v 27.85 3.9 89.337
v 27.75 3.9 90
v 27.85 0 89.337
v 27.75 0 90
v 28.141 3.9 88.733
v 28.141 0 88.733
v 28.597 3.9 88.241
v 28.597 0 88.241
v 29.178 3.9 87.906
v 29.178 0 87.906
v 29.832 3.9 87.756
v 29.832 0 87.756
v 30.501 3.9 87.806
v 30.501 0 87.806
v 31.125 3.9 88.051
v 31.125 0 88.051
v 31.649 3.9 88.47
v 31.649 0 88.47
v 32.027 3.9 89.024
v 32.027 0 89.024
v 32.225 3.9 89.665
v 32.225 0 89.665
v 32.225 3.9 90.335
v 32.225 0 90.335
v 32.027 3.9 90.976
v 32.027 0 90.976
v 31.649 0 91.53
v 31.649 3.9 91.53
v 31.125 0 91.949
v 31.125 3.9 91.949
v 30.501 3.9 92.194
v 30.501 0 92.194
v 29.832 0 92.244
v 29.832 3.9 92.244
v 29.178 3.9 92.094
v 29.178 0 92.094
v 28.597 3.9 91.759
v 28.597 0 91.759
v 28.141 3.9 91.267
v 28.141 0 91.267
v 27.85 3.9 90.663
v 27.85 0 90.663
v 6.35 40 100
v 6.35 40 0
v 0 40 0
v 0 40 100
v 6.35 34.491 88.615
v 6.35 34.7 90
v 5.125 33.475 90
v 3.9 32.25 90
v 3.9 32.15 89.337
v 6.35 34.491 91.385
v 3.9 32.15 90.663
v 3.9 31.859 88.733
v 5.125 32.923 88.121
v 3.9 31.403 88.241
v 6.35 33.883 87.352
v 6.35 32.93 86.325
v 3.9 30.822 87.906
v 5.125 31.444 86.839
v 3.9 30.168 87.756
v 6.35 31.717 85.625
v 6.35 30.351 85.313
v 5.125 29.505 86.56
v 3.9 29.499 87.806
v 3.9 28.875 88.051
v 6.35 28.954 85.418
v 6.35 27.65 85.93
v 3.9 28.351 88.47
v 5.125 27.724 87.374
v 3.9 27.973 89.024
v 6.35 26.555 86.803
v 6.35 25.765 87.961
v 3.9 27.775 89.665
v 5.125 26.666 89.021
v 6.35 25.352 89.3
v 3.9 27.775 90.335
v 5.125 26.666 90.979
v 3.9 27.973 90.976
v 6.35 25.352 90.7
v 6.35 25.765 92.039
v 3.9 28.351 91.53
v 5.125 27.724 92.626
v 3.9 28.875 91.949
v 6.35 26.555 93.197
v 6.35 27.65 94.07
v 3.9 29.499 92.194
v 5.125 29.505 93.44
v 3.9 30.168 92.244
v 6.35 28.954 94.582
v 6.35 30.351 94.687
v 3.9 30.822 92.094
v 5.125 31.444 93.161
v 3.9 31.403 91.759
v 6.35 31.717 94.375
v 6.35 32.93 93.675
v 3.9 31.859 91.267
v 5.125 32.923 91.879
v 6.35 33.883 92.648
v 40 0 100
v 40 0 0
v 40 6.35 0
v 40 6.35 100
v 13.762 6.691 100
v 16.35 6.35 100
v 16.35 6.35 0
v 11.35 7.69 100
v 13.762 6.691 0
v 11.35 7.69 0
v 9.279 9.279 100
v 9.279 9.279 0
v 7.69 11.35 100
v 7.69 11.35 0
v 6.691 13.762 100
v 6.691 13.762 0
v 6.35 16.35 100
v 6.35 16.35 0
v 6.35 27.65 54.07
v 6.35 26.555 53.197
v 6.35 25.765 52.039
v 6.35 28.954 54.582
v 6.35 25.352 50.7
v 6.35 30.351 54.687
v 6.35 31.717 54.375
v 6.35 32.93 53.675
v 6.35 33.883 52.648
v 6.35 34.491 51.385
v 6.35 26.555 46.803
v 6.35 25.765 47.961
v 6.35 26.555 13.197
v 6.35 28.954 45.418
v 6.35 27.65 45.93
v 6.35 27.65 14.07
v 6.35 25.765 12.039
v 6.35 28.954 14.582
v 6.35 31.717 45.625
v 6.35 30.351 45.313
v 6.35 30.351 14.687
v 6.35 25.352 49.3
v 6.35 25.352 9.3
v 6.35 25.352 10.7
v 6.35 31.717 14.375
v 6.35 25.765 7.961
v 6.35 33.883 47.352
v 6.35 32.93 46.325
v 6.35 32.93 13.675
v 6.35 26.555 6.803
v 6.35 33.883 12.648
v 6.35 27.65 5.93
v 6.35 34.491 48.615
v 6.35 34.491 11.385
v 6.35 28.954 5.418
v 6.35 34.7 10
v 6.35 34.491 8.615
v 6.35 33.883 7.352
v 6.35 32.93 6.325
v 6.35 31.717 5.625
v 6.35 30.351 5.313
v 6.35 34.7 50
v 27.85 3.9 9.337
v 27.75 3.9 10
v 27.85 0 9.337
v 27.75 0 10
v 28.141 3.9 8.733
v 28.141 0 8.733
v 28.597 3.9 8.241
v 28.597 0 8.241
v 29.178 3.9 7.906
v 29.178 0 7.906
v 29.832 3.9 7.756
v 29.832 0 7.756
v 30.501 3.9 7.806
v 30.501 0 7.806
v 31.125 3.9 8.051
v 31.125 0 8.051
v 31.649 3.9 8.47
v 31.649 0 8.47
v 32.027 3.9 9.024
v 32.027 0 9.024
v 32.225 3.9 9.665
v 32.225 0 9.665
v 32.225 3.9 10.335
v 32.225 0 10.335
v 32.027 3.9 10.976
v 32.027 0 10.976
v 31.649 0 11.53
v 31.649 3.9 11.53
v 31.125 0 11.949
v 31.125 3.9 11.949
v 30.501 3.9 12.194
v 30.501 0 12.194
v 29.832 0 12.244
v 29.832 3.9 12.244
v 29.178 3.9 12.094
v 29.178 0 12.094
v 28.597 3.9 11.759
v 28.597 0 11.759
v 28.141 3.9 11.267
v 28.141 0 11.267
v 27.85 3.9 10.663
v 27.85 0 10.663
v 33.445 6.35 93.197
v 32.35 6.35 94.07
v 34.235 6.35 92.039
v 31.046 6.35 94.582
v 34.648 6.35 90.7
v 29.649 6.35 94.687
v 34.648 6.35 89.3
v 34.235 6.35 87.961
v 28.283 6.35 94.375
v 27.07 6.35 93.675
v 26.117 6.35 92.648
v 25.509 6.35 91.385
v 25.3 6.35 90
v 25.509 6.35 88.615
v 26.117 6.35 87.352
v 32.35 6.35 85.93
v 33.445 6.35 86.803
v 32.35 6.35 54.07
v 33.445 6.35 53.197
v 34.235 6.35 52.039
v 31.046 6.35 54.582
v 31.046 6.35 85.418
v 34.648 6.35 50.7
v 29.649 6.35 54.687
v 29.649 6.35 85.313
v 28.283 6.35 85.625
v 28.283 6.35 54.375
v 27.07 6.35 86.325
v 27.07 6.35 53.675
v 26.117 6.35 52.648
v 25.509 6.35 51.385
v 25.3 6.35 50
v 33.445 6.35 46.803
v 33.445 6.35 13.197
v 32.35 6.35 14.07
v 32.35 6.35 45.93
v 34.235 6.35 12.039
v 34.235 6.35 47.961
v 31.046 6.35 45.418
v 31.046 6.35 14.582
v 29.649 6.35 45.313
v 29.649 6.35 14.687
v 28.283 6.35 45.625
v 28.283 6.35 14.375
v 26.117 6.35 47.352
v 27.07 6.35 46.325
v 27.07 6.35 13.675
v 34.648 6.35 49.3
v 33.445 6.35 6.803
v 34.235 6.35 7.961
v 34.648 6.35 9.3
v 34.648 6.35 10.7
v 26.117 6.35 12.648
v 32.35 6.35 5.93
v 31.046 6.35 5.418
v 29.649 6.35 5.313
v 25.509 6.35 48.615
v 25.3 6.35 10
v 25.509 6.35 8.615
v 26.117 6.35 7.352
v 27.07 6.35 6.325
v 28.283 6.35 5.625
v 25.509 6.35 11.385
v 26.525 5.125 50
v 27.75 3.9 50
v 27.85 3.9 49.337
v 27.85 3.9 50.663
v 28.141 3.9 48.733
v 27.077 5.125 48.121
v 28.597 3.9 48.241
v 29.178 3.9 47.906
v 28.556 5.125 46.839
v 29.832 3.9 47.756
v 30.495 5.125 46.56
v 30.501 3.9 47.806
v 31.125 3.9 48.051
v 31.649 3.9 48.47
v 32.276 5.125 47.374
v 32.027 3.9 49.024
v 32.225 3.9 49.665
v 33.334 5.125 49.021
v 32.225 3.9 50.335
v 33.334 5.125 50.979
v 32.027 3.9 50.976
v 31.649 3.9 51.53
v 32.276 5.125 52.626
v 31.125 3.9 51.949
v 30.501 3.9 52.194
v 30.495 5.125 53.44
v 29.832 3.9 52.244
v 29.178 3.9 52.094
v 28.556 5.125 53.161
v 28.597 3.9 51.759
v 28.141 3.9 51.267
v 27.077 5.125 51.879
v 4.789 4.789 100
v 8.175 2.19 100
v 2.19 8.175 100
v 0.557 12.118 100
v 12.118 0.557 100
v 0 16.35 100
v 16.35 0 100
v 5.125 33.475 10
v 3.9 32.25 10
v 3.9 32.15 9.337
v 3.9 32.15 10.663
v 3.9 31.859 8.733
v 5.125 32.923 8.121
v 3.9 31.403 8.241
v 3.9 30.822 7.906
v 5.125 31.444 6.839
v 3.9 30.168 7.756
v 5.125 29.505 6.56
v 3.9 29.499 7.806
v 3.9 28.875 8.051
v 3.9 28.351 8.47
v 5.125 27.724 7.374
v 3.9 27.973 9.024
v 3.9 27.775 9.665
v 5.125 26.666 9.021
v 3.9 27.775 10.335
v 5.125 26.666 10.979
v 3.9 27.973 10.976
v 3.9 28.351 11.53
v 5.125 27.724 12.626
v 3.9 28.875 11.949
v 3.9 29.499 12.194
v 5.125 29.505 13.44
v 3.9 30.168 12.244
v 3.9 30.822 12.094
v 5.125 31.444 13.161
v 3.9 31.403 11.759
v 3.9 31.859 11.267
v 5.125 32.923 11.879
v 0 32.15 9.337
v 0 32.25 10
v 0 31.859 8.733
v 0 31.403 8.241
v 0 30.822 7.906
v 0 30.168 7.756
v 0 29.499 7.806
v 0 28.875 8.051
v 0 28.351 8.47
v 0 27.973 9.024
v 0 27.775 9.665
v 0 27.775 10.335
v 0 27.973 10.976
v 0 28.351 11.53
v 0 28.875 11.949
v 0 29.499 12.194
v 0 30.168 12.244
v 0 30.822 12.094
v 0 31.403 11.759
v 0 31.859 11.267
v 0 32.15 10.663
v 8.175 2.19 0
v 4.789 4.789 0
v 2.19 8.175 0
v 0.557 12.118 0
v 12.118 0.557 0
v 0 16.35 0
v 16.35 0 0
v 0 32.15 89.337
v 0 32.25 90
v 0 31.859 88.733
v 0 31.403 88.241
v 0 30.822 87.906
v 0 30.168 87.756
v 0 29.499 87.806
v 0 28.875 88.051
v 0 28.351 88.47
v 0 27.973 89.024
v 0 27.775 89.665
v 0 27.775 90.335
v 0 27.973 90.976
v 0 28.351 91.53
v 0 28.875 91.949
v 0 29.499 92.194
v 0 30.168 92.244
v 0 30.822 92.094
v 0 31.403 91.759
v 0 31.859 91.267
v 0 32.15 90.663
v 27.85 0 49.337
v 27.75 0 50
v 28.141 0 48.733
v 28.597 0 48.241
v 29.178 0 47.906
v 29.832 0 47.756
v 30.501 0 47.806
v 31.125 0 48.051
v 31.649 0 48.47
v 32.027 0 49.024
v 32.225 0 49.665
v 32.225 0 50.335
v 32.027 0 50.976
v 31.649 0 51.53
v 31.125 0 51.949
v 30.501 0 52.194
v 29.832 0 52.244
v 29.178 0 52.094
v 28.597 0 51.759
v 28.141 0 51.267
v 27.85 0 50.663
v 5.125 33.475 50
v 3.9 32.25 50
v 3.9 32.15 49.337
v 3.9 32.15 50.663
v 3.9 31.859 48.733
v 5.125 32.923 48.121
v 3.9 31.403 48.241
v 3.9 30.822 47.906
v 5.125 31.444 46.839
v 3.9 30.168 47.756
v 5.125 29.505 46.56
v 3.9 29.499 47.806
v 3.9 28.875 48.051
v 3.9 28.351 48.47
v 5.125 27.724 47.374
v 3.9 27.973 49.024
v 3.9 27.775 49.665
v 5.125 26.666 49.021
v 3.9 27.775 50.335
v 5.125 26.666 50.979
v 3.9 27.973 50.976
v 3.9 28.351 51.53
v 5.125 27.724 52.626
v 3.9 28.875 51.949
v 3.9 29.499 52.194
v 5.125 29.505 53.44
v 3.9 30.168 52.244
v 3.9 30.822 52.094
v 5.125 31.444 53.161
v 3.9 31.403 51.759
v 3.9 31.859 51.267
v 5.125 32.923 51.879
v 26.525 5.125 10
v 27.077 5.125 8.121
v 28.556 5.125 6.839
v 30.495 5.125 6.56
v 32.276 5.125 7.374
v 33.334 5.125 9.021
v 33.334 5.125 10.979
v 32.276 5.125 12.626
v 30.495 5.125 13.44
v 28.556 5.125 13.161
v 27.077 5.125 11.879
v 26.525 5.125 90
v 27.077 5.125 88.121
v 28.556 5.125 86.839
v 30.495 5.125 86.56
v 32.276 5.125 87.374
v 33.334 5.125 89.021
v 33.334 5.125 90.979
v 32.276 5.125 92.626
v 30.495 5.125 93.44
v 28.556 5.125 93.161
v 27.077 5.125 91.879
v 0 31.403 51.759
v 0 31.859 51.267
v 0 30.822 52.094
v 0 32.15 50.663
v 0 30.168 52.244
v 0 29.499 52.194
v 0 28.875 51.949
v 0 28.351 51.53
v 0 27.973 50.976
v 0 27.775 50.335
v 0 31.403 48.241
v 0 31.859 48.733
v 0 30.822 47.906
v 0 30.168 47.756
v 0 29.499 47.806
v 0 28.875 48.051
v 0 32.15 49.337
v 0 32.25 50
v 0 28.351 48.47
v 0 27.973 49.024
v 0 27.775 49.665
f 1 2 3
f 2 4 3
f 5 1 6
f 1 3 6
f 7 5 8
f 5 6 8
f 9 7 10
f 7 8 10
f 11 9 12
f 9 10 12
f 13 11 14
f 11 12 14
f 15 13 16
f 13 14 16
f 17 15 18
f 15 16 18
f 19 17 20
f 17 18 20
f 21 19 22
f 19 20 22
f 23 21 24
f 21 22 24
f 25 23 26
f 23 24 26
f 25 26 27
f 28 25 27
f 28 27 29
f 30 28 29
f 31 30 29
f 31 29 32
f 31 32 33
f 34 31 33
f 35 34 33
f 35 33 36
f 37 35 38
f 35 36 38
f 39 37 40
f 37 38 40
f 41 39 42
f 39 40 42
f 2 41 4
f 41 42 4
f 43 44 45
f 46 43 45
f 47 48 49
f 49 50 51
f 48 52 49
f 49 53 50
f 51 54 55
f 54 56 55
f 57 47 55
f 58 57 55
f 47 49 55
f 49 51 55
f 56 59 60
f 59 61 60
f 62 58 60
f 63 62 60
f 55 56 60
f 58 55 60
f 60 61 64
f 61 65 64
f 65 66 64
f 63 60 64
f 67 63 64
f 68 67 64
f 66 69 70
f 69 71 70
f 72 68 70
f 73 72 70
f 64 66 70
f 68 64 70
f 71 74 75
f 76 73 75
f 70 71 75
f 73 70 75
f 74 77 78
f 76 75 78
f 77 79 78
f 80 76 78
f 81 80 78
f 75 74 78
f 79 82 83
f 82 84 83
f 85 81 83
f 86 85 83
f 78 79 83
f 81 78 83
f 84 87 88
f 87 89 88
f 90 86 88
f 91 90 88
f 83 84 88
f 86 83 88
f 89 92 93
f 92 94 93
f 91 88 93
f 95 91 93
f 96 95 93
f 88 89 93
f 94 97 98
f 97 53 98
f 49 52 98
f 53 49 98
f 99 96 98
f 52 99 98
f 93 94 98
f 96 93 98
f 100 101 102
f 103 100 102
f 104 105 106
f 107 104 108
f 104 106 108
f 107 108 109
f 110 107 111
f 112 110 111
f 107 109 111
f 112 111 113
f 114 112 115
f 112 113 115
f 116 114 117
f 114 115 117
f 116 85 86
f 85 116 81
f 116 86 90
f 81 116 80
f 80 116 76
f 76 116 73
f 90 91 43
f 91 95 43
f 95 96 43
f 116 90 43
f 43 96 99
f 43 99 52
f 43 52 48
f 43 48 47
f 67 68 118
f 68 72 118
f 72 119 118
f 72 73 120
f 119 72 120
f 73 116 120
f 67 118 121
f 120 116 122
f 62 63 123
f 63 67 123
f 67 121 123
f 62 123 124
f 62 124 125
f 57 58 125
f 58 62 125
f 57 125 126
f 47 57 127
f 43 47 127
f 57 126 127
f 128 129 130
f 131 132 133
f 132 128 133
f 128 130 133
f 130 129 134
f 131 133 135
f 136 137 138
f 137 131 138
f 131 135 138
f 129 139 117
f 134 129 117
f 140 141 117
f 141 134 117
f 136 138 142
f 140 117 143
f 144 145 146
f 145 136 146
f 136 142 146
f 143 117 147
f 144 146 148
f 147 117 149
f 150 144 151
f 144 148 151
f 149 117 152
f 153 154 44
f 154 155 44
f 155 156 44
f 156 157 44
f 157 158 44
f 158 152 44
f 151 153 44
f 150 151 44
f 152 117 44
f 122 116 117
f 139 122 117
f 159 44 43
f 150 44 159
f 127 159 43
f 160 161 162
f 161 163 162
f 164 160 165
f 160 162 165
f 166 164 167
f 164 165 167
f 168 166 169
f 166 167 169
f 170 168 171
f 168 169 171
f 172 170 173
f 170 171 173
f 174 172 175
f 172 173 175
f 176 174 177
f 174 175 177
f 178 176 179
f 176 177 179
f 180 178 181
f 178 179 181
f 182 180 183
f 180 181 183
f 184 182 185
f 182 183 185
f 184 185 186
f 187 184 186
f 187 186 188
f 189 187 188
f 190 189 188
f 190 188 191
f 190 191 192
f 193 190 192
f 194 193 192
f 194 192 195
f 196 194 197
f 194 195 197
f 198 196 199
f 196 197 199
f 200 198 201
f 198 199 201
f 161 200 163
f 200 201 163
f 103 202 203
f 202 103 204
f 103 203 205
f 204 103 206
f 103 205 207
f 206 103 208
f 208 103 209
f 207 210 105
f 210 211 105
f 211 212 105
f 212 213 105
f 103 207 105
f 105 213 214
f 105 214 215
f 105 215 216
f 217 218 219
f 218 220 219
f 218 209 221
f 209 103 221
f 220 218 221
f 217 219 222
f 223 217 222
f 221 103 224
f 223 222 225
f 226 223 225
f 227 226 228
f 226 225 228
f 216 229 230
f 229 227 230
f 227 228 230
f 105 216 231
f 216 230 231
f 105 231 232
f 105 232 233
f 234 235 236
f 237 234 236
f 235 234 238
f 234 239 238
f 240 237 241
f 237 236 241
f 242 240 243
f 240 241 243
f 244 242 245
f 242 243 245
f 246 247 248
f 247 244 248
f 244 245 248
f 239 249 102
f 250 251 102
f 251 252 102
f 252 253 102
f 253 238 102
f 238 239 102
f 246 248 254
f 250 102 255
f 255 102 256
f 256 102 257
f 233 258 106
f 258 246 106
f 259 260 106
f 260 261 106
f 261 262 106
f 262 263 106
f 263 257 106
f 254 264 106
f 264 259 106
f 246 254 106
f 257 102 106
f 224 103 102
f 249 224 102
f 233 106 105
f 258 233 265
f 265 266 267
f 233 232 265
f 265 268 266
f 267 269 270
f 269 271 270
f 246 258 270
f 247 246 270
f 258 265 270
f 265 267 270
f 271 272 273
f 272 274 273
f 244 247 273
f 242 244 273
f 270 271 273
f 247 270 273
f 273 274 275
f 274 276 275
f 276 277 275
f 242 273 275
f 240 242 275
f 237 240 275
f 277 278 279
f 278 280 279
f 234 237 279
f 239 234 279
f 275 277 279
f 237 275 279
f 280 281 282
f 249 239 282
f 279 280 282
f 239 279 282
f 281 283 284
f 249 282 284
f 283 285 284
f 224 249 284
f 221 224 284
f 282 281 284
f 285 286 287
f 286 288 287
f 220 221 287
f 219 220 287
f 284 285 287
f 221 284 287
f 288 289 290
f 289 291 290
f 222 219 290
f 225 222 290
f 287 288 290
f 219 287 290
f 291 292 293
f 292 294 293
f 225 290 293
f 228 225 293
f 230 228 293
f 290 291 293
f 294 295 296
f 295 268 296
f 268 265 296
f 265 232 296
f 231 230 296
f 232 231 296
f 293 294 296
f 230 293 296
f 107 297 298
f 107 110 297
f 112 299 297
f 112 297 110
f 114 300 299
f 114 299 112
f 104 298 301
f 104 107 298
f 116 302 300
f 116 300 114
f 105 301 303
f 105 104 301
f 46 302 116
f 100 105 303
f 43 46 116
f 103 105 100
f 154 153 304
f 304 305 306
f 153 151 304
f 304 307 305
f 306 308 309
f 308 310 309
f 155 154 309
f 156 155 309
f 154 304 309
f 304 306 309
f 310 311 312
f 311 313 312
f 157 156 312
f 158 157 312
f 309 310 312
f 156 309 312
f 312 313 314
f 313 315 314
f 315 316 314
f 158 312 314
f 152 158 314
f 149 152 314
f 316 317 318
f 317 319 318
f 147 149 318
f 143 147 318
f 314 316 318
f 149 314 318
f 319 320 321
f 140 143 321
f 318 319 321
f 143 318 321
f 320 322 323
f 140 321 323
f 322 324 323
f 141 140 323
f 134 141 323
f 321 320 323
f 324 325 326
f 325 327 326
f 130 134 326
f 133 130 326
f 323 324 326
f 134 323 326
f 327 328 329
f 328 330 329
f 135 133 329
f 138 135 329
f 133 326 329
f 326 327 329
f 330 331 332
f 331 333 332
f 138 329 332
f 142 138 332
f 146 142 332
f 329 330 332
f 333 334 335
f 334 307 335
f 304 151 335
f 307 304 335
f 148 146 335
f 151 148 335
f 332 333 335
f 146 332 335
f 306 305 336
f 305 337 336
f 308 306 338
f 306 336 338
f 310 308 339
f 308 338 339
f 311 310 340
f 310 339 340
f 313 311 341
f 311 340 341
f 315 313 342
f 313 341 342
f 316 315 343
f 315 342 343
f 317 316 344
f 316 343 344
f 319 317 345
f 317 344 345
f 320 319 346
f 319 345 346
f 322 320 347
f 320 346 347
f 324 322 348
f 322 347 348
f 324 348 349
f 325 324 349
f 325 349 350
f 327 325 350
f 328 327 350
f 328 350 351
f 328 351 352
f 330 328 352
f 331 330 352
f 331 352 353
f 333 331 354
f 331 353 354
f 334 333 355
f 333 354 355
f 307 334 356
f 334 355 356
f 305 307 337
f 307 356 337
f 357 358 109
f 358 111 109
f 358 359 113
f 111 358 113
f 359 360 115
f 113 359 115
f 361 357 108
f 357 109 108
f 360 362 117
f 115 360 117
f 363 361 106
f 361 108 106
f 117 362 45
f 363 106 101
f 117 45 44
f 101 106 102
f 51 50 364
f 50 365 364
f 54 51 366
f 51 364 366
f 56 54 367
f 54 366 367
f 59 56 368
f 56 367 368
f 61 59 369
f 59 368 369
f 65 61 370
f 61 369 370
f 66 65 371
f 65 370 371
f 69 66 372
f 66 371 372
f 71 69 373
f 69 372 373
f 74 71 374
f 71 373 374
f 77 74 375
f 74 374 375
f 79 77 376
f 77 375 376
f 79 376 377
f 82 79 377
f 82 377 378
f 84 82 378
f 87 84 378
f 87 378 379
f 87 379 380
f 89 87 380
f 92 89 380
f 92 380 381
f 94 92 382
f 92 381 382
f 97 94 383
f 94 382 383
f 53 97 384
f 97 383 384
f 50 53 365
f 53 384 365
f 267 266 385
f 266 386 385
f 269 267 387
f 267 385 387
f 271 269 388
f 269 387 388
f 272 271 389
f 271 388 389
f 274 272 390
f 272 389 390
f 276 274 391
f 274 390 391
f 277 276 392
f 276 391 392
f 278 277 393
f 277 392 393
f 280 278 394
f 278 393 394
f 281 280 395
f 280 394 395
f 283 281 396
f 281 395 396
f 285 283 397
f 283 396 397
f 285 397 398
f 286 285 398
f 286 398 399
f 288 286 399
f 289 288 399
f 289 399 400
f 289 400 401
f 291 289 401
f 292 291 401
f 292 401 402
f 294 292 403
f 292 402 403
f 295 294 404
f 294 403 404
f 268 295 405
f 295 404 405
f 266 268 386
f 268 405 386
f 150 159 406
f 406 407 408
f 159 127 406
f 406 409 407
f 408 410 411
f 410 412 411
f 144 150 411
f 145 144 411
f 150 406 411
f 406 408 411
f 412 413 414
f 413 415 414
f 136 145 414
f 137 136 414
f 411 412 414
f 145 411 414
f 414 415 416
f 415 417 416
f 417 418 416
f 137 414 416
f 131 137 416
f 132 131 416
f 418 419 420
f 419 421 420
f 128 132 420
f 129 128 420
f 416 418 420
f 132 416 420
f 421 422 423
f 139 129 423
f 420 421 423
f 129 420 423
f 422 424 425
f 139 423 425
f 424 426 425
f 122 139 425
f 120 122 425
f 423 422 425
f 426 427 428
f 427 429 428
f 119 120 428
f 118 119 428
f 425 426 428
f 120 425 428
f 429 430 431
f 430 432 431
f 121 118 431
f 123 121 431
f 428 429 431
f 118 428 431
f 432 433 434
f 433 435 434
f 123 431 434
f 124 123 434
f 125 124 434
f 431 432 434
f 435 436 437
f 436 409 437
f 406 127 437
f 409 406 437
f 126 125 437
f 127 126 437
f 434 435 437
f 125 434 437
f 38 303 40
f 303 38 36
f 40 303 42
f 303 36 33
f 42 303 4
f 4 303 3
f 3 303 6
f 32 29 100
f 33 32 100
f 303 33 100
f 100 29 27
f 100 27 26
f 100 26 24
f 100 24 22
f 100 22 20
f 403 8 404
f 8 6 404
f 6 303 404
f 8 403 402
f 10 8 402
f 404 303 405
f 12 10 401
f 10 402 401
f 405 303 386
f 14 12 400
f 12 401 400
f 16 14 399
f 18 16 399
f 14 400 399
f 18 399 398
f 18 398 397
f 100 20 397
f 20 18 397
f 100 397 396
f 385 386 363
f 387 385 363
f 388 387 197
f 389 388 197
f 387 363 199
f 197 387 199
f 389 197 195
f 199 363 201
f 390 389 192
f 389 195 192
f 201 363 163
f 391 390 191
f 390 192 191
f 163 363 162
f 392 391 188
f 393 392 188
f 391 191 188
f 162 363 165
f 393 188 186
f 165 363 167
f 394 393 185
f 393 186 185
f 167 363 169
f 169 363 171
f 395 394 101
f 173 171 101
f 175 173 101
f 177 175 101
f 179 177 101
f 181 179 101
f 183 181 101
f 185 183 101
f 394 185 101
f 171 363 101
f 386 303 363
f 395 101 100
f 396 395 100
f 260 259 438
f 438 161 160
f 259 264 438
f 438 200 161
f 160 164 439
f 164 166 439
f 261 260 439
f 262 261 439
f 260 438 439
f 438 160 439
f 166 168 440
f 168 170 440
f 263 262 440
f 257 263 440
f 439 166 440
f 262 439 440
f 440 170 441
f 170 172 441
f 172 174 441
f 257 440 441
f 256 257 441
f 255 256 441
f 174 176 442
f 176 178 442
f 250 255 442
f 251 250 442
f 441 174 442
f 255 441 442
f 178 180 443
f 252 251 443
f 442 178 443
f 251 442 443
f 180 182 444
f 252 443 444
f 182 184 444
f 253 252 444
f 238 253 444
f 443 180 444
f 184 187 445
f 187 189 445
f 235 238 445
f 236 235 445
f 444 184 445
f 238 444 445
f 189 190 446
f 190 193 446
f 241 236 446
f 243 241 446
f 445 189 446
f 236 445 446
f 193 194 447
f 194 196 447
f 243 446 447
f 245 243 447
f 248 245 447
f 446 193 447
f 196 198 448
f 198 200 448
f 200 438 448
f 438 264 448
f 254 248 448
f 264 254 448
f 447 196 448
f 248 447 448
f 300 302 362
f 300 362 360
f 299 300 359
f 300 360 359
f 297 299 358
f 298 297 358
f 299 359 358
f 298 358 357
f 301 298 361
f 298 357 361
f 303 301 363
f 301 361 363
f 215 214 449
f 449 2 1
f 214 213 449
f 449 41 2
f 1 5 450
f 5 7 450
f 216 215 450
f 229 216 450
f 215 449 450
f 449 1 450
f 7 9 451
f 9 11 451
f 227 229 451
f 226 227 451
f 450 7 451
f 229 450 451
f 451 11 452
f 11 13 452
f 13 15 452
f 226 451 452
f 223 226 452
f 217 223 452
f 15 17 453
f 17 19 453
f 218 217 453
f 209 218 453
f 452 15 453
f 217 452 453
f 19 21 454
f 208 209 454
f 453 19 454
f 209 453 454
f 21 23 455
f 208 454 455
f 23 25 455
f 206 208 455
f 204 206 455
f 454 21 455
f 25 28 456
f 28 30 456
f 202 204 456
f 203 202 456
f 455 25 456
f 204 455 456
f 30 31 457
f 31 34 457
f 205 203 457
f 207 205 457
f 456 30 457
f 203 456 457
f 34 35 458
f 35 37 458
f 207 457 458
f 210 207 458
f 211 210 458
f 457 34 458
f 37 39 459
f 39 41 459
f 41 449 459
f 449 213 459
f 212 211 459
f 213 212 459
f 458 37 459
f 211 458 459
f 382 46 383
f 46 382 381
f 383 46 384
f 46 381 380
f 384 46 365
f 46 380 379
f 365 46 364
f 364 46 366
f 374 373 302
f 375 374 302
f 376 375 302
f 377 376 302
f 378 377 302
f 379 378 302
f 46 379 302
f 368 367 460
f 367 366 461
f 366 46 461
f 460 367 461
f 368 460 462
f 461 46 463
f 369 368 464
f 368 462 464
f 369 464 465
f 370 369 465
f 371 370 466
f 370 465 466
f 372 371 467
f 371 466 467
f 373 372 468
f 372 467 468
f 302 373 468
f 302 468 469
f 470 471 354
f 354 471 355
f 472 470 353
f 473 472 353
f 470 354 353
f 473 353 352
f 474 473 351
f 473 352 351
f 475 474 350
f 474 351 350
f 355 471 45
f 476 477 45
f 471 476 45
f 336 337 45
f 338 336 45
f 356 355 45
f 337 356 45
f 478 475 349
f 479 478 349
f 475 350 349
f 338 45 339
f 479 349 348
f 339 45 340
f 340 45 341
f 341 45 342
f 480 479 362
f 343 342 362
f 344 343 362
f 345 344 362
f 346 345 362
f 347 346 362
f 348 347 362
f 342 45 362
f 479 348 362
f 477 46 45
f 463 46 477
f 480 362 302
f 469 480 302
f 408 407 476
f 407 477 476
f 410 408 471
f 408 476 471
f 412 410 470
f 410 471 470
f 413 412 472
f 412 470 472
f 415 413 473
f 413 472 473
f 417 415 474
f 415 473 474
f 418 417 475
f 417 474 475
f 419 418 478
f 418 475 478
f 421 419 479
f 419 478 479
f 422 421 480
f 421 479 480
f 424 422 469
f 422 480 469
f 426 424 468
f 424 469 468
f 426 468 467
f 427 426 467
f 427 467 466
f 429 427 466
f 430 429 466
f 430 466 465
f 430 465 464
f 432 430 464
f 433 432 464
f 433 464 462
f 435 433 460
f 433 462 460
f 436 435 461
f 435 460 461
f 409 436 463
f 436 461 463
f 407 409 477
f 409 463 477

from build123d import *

# Parameters (mm, degrees)
BOSS_EXTRUDE1_DEPTH                             = 100
CSK_FOR_M4_FLAT_HEAD_MACHINE_SCREW1_D           = 4.5
CSK_FOR_M4_FLAT_HEAD_MACHINE_SCREW1_CSINK_D     = 9.4
CSK_FOR_M4_FLAT_HEAD_MACHINE_SCREW1_CSINK_ANGLE = 90
CSK_FOR_M4_FLAT_HEAD_MACHINE_SCREW4_D           = 4.5
CSK_FOR_M4_FLAT_HEAD_MACHINE_SCREW4_CSINK_D     = 9.4
CSK_FOR_M4_FLAT_HEAD_MACHINE_SCREW4_CSINK_ANGLE = 90


with BuildPart() as part:
    # Sketch1 → Boss-Extrude1 (new body)
    with BuildSketch(Plane.XY):
        with BuildLine():
            Line((0, 40), (0, 16.35))
            ThreePointArc((0, 16.35), (4.788804128, 4.788804128), (16.35, 0))
            Line((16.35, 0), (40, 0))
            Line((40, 0), (40, 6.35))
            Line((40, 6.35), (16.35, 6.35))
            ThreePointArc((16.35, 6.35), (9.278932188, 9.278932188), (6.35, 16.35))
            Line((6.35, 16.35), (6.35, 40))
            Line((6.35, 40), (0, 40))
        make_face()
    extrude(amount=BOSS_EXTRUDE1_DEPTH)

    # CSK for M4 Flat Head Machine Screw1 (through all)
    with Locations(Plane(origin=(0, 6.35, 0), x_dir=(1, 0, 0), z_dir=(0, 1, 0))):
        with Locations((30, -90), (30, -50), (30, -10)):
            CounterSinkHole(CSK_FOR_M4_FLAT_HEAD_MACHINE_SCREW1_D / 2, CSK_FOR_M4_FLAT_HEAD_MACHINE_SCREW1_CSINK_D / 2, counter_sink_angle=CSK_FOR_M4_FLAT_HEAD_MACHINE_SCREW1_CSINK_ANGLE)

    # CSK for M4 Flat Head Machine Screw4 (through all)
    with Locations(Plane(origin=(6.35, 0, 0), x_dir=(0, -1, 0), z_dir=(1, 0, 0))):
        with Locations((-30, -90), (-30, -50), (-30, -10)):
            CounterSinkHole(CSK_FOR_M4_FLAT_HEAD_MACHINE_SCREW4_D / 2, CSK_FOR_M4_FLAT_HEAD_MACHINE_SCREW4_CSINK_D / 2, counter_sink_angle=CSK_FOR_M4_FLAT_HEAD_MACHINE_SCREW4_CSINK_ANGLE)


solid = part.part
